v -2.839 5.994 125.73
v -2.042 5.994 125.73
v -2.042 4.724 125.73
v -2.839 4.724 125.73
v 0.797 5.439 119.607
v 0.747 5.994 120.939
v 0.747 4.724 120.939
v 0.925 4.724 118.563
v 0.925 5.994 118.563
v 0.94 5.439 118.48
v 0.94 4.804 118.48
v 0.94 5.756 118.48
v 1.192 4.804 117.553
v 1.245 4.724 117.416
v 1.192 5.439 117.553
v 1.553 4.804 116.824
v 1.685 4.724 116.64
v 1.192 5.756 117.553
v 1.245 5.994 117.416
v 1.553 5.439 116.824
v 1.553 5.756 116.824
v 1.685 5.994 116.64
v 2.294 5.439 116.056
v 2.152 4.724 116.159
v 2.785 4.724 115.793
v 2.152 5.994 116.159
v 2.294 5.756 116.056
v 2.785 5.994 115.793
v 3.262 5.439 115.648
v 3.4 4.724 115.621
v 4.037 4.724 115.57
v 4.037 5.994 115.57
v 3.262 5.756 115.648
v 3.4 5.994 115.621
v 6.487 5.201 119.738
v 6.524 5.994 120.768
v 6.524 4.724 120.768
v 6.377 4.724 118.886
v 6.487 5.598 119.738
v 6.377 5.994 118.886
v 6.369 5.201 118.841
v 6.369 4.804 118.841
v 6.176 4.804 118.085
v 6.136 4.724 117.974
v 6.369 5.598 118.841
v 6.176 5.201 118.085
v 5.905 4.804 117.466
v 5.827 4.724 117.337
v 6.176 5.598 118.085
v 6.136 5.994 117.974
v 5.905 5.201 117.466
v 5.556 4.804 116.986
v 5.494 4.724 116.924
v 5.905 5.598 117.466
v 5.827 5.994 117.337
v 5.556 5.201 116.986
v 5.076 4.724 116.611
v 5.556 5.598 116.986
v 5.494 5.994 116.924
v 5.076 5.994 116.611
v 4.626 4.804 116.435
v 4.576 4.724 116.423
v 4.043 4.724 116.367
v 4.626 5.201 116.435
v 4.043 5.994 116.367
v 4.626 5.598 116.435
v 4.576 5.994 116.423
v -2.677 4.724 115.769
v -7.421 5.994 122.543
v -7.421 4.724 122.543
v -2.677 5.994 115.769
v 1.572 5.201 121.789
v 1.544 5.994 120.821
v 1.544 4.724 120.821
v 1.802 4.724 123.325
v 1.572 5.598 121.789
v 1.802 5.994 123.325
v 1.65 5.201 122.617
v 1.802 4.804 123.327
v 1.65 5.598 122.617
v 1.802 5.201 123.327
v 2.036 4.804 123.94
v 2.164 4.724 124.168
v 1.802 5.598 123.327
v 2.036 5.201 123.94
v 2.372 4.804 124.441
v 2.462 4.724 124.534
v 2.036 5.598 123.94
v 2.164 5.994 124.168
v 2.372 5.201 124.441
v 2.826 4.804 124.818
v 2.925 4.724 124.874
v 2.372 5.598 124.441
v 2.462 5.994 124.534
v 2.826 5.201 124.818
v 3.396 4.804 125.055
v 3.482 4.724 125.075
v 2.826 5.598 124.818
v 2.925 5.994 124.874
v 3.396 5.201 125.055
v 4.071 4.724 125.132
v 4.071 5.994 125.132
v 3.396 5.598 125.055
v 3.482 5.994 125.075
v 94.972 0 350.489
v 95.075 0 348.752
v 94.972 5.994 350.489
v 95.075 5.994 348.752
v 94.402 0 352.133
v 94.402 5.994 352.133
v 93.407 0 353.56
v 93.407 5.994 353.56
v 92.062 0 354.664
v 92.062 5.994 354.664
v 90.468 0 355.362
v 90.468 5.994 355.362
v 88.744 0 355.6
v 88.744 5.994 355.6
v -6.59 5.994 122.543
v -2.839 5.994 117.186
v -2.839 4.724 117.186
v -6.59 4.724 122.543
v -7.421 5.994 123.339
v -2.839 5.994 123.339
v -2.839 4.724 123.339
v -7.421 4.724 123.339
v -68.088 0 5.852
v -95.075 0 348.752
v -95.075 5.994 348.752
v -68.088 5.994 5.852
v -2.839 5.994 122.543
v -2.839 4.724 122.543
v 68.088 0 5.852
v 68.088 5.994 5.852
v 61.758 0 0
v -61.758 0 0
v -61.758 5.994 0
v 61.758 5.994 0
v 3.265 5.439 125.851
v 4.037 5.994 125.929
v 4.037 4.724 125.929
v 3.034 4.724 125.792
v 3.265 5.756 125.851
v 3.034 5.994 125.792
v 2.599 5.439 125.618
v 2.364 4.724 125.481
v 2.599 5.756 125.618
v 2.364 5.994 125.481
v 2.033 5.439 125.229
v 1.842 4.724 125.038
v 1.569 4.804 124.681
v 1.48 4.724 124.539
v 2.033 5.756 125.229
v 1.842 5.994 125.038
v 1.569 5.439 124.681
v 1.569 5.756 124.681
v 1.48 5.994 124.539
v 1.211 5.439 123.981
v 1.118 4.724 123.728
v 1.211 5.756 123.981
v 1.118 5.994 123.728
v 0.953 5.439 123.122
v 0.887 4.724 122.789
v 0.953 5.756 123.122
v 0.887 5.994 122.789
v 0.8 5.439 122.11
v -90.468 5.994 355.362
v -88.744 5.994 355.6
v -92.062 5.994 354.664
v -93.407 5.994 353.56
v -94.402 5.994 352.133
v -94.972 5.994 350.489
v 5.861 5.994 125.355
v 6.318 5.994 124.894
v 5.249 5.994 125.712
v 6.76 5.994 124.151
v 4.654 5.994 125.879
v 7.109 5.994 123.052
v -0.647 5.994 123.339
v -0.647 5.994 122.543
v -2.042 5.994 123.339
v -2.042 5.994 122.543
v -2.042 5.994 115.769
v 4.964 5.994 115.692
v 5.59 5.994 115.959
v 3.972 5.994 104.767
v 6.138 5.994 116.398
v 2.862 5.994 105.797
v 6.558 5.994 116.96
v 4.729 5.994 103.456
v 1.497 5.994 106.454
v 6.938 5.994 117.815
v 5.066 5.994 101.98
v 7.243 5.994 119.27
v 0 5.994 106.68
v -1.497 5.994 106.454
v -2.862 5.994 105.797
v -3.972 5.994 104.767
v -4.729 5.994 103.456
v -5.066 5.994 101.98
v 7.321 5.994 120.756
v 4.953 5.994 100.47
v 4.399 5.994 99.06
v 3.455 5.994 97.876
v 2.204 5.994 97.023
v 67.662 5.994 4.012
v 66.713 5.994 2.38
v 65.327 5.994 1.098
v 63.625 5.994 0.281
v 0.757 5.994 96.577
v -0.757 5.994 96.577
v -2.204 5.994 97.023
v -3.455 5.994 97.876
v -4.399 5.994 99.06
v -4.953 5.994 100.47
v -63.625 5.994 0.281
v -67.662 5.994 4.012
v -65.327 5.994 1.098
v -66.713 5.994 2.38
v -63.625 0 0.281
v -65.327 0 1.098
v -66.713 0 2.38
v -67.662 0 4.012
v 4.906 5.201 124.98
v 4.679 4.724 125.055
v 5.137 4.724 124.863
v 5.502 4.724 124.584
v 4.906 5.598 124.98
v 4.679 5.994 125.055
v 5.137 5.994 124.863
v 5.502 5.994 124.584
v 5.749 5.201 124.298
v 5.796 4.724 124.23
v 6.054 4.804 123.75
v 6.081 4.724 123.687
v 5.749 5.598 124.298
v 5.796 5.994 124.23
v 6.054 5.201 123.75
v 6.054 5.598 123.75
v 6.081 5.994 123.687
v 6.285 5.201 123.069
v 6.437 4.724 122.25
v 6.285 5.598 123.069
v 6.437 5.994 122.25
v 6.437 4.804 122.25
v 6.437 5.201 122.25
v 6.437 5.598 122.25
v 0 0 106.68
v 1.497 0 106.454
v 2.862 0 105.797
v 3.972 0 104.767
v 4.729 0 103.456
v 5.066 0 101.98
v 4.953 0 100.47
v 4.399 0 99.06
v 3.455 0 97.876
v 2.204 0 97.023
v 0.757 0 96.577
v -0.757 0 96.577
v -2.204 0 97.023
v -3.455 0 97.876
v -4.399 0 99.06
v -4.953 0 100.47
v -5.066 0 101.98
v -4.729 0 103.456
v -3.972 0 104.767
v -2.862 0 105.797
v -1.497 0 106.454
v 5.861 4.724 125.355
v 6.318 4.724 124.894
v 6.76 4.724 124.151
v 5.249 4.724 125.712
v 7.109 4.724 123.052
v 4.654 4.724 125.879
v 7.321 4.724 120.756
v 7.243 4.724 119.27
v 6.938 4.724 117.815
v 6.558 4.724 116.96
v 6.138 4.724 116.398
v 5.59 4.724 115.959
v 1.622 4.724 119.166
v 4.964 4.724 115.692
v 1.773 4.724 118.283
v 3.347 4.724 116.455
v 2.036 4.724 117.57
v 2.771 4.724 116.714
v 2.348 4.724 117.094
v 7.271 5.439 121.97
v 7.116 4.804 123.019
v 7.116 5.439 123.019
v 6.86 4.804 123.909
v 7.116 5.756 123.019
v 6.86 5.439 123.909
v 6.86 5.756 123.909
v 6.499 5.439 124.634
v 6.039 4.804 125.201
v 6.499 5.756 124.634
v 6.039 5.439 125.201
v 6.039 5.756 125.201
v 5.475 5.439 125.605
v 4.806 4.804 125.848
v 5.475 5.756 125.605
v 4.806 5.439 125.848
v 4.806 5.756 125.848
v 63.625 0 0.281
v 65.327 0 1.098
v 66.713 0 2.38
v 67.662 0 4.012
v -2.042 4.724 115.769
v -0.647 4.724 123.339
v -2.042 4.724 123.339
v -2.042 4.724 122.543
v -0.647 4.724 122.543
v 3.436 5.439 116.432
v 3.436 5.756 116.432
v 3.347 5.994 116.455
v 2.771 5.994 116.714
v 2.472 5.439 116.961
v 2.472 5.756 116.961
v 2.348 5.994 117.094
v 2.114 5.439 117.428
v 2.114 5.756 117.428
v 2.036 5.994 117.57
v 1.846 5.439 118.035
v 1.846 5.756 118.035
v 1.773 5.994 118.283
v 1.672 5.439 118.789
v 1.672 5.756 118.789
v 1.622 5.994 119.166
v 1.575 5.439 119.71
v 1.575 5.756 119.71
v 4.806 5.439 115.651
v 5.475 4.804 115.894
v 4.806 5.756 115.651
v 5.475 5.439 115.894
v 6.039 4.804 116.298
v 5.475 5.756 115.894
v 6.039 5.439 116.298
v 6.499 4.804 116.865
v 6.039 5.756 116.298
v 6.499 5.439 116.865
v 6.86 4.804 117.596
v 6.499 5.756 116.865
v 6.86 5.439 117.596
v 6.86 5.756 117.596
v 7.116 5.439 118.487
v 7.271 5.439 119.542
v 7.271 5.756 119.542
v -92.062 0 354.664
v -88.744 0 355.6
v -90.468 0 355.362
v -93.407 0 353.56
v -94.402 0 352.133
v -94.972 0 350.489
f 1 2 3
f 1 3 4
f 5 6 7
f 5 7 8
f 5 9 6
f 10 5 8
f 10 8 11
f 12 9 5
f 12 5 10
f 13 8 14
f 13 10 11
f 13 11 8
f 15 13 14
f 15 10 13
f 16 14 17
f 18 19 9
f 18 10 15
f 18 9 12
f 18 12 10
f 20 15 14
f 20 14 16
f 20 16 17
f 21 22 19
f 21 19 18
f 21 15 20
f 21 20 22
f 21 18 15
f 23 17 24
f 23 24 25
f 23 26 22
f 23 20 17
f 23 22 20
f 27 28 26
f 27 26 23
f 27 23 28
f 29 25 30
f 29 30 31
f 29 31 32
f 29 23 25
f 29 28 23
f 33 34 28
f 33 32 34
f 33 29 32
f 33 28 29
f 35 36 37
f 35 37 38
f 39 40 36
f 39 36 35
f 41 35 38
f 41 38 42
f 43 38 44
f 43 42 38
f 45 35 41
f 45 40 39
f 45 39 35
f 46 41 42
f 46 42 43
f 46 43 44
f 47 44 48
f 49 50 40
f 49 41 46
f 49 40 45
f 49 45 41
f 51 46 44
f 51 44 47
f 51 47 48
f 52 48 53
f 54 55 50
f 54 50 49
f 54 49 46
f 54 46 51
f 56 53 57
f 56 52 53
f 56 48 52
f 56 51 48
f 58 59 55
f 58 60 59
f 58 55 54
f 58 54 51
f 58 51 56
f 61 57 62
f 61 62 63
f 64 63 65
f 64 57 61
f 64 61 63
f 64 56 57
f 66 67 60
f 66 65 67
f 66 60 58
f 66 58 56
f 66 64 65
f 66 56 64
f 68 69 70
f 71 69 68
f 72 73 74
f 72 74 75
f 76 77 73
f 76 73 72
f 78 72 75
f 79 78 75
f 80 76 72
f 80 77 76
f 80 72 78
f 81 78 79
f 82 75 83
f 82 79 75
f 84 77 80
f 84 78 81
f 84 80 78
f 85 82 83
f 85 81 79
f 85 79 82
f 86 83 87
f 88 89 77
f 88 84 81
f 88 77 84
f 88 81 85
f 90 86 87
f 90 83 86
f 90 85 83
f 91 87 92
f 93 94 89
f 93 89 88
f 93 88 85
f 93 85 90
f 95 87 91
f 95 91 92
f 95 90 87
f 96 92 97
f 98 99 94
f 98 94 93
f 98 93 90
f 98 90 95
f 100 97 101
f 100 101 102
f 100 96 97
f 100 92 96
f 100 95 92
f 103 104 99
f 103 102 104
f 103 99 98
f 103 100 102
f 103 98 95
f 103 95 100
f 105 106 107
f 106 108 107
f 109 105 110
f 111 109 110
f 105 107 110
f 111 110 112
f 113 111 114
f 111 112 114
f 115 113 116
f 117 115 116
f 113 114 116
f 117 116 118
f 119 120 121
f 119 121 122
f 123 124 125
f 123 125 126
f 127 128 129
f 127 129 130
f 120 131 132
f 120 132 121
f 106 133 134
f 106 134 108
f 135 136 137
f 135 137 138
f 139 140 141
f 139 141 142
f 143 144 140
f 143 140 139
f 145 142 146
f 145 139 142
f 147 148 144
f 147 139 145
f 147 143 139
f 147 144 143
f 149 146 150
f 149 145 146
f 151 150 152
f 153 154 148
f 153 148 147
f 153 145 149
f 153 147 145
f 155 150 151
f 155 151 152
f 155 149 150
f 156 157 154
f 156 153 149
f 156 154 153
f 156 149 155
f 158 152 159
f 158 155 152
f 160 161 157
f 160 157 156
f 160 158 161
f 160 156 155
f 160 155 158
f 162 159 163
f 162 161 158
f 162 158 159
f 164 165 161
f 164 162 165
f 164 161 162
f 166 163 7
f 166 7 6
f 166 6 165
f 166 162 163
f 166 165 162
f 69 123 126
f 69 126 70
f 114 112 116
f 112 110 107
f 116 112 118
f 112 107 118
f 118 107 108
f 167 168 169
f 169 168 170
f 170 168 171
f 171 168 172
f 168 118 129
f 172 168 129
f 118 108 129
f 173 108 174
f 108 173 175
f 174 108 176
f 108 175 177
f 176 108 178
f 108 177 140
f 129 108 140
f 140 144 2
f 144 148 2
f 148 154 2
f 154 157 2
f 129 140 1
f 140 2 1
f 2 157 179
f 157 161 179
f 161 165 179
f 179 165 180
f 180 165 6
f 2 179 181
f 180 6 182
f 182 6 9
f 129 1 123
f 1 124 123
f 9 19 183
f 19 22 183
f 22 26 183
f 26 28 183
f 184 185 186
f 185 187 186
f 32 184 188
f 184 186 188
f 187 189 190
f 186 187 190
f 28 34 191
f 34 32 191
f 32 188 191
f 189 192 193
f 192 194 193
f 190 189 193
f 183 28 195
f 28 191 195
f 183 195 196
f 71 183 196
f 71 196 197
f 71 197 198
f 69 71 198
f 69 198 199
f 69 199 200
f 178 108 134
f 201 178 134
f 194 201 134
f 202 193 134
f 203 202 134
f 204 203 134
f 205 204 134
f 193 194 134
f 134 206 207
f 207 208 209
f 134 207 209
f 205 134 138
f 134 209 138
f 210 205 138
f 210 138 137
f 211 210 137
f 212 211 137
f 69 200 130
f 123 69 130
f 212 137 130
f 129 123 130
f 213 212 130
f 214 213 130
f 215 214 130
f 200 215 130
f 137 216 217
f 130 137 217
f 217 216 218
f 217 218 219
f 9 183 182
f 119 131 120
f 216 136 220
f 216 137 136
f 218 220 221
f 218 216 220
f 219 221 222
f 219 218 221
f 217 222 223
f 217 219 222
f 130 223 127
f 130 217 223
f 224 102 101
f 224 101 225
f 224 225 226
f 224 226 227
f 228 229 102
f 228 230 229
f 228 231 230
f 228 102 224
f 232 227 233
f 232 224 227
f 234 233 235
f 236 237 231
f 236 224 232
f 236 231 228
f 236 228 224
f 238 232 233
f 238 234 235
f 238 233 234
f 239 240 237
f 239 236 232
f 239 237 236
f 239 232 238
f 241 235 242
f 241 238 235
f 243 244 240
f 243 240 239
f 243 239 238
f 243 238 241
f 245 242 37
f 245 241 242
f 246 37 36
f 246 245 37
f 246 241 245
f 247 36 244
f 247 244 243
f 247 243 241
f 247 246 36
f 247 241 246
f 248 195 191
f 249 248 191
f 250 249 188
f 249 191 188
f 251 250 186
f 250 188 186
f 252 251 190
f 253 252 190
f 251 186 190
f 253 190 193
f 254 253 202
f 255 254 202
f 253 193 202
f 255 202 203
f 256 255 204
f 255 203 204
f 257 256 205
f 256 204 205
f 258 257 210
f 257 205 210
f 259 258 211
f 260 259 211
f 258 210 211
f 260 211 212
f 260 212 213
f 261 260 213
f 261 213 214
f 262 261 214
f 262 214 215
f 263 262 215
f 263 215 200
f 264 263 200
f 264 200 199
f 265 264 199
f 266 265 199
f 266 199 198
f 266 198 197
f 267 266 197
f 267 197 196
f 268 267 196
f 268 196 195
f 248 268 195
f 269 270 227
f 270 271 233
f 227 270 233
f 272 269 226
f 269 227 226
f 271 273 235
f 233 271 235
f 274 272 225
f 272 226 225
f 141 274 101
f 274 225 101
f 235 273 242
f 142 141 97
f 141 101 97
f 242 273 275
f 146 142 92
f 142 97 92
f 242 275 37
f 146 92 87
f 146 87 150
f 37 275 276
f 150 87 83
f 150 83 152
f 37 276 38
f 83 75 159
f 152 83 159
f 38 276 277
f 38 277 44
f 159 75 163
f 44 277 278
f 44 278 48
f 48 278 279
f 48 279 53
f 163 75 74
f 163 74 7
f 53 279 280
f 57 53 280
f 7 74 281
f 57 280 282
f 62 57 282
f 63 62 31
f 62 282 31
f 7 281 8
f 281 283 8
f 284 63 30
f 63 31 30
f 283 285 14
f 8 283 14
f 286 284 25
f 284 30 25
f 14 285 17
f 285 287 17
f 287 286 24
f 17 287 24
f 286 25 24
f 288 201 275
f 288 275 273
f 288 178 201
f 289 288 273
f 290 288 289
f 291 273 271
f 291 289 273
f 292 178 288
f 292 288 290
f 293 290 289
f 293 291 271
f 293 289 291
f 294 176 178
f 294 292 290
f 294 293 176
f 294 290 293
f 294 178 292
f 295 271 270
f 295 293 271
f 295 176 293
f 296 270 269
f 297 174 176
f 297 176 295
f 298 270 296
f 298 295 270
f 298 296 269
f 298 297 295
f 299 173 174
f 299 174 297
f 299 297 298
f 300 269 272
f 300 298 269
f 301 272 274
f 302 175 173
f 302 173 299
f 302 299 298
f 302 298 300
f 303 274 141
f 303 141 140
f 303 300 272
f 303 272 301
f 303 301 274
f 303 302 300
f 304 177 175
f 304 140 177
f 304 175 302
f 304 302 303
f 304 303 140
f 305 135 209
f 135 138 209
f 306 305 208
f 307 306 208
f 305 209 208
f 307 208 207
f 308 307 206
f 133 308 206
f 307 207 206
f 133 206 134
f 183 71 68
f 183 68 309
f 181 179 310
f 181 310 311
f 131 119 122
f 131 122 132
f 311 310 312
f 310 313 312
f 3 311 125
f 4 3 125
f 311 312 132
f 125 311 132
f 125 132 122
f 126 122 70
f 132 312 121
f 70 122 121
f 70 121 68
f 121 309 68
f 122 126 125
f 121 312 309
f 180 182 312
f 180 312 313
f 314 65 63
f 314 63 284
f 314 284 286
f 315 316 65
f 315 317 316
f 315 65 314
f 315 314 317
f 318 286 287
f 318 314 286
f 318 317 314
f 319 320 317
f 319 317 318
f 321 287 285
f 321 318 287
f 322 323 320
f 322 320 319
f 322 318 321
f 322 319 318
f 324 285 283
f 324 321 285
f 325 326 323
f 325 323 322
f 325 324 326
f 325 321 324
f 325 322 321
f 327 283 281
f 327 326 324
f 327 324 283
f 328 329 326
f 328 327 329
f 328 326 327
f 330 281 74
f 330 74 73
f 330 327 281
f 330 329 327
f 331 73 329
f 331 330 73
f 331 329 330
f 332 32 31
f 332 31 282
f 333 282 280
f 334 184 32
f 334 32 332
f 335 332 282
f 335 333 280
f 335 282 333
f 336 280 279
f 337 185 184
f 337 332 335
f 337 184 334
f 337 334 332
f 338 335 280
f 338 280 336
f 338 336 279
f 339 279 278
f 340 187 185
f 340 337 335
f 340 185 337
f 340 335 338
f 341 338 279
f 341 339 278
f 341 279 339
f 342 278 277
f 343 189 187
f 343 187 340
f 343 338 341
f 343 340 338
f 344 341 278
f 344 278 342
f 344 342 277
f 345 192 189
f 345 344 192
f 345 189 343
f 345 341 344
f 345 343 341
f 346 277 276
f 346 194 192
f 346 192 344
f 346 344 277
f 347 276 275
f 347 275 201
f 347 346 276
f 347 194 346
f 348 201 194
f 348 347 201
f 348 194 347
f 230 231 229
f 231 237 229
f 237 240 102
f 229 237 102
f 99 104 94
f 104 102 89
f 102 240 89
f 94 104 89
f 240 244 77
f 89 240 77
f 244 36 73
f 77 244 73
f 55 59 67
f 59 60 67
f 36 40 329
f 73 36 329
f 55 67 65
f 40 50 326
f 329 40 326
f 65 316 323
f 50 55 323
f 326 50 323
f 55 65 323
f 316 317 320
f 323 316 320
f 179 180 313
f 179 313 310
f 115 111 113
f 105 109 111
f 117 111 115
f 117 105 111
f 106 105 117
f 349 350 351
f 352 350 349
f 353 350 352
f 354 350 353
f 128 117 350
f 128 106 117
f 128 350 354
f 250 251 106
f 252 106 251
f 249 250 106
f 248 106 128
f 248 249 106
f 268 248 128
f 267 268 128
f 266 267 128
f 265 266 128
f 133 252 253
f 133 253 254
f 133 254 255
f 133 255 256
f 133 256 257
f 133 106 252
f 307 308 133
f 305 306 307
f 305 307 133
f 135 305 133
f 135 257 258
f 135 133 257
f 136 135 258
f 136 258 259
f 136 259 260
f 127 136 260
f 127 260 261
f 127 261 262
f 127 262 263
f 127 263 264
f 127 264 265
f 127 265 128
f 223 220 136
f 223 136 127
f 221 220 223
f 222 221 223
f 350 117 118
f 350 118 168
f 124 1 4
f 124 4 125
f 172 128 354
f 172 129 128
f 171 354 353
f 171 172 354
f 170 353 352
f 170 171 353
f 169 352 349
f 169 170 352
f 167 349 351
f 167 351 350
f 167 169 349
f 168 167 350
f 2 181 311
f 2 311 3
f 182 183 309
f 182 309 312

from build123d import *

# Parameters (mm, degrees)
BOSS_EXTRUDE1_DEPTH = 5.9944
SKETCH2_R           = 5.08
CUT_EXTRUDE1_DEPTH  = 369.278830147
CUT_EXTRUDE2_DEPTH  = 1.27
FILLET1_R           = 6.35


with BuildPart() as part:
    # Sketch1 → Boss-Extrude1 (new body)
    with BuildSketch(Plane(origin=(0, 0, 0), x_dir=(1, 0, 0), z_dir=(0, 1, 0))):
        Polygon((-67.6275, 0), (67.6275, 0), (95.613826947, -355.6), (-95.613826947, -355.6), align=None)
    extrude(amount=BOSS_EXTRUDE1_DEPTH)

    # Sketch2 → Cut-Extrude1 (cut, through all)
    with BuildSketch(Plane(origin=(0, 5.9944, 0), x_dir=(1, 0, 0), z_dir=(0, 1, 0))):
        with Locations(Location((0, -101.6, 0), (0, 0, 270))):
            Circle(SKETCH2_R)
    extrude(amount=-CUT_EXTRUDE1_DEPTH, mode=Mode.SUBTRACT)

    # Sketch3 → Cut-Extrude2 (cut)
    # profile 1 of 2: a face of its own
    with BuildSketch(Plane(origin=(0, 5.9944, 0), x_dir=(1, 0, 0), z_dir=(0, 1, 0))):
        Polygon((-0.64745098, -123.339411765), (-2.041960784, -123.339411765), (-2.041960784, -125.73), (-2.838823529, -125.73), (-2.838823529, -123.339411765), (-7.420784314, -123.339411765), (-7.420784314, -122.54254902), (-2.676960784, -115.769215686), (-2.041960784, -115.769215686), (-2.041960784, -122.54254902), (-0.64745098, -122.54254902), align=None)
        Polygon((-2.838823529, -122.54254902), (-2.838823529, -117.185514706), (-6.589681373, -122.54254902), align=None, mode=Mode.SUBTRACT)
    # profile 2 of 2: a face of its own
    with BuildSketch(Plane(origin=(0, 5.9944, 0), x_dir=(1, 0, 0), z_dir=(0, 1, 0))):
        with BuildLine():
            add(Edge.make_bspline(
                [(7.321176471, -120.755833333), (7.318828398, -120.964435203), (7.314268428, -121.369541156), (7.278053355, -121.956745016), (7.212590307, -122.503235643), (7.123658685, -123.008755237), (7.008266172, -123.474678786), (6.871087333, -123.902056716), (6.702092819, -124.287425995), (6.508215245, -124.632617465), (6.291747836, -124.939879658), (6.045192851, -125.205053414), (5.774903263, -125.430333986), (5.47658793, -125.612983557), (5.154255704, -125.75891836), (4.803074469, -125.854617169), (4.428855706, -125.921386338), (4.17035965, -125.926554175), (4.037230392, -125.929215686)],
                knots=[0, 0, 0, 0, 1.444951835, 2.806104229, 4.07292158, 5.255788138, 6.359234241, 7.395665143, 8.361159583, 9.268708362, 10.134304339, 10.95819393, 11.769860228, 12.563733626, 13.374508403, 14.211708464, 15.079003648, 16, 16, 16, 16], degree=3))
            add(Edge.make_bspline(
                [(4.037230392, -125.929215686), (3.904173743, -125.926129436), (3.644961099, -125.920116997), (3.27017657, -125.859085315), (2.920411161, -125.763594373), (2.59640029, -125.625895969), (2.300139806, -125.446021212), (2.024069589, -125.233082993), (1.778627689, -124.975727427), (1.560171839, -124.679785297), (1.365195047, -124.347714828), (1.20253453, -123.973246068), (1.058366082, -123.562916679), (0.945634561, -123.112374896), (0.854092493, -122.625055928), (0.795691583, -122.097466824), (0.752427723, -121.531621273), (0.748884772, -121.140869167), (0.747058824, -120.939485294)],
                knots=[0, 0, 0, 0, 0.942187573, 1.835510922, 2.682899358, 3.50644207, 4.321041037, 5.132947656, 5.970162763, 6.831912057, 7.734836617, 8.692673853, 9.720484412, 10.813675431, 11.980358204, 13.231647047, 14.573260056, 16, 16, 16, 16], degree=3))
            add(Edge.make_bspline(
                [(0.747058824, -120.939485294), (0.749189738, -120.709081181), (0.753301018, -120.264550974), (0.791785956, -119.623892076), (0.848921011, -119.033607435), (0.931327178, -118.493626742), (1.041809864, -118.002956136), (1.18209133, -117.562748274), (1.344352733, -117.168906906), (1.542969603, -116.826611164), (1.76640963, -116.527719309), (2.011736134, -116.265404707), (2.288722816, -116.05041743), (2.588716504, -115.873144616), (2.914180915, -115.735469097), (3.266151279, -115.640569114), (3.642854433, -115.578856283), (3.90312556, -115.573011518), (4.037230392, -115.57)],
                knots=[0, 0, 0, 0, 1.545108237, 2.981054794, 4.302900454, 5.52134946, 6.64223763, 7.672189641, 8.617001291, 9.493094031, 10.318410963, 11.115795503, 11.893970542, 12.661367534, 13.447190288, 14.255881535, 15.101342067, 16, 16, 16, 16], degree=3))
            add(Edge.make_bspline(
                [(4.037230392, -115.57), (4.170238627, -115.57448963), (4.428282356, -115.583199774), (4.804192318, -115.642018007), (5.152618043, -115.745772402), (5.478653289, -115.884356647), (5.772542755, -116.073295118), (6.047681503, -116.293496105), (6.289327541, -116.562467111), (6.510315761, -116.867199073), (6.701841879, -117.215226558), (6.869820244, -117.601739646), (7.009467972, -118.029371708), (7.123413066, -118.496780378), (7.21266615, -119.005311375), (7.277684225, -119.552884468), (7.314472673, -120.141074122), (7.318890361, -120.546189931), (7.321176471, -120.755833333)],
                knots=[0, 0, 0, 0, 0.919968977, 1.784793451, 2.622728724, 3.429378823, 4.225844794, 5.031728358, 5.85964663, 6.718105312, 7.630541726, 8.601153045, 9.629202519, 10.737948011, 11.926092541, 13.198121829, 14.550055913, 16, 16, 16, 16], degree=3))
        make_face()
        with BuildLine():
            add(Edge.make_bspline(
                [(6.524313725, -120.768284314), (6.522566947, -120.59082563), (6.519183425, -120.247086842), (6.491882586, -119.747351272), (6.442379883, -119.282006526), (6.374689104, -118.850591154), (6.287787289, -118.454473729), (6.184085269, -118.091152232), (6.054789642, -117.764549081), (5.914753741, -117.468482457), (5.746577036, -117.21145005), (5.563889756, -116.983709924), (5.356631682, -116.79434266), (5.134096525, -116.633668508), (4.887159424, -116.51702345), (4.624573174, -116.42744118), (4.339914631, -116.378499272), (4.144272117, -116.370819959), (4.043455882, -116.366862745)],
                knots=[0, 0, 0, 0, 1.502278276, 2.909924168, 4.234983773, 5.462469173, 6.604815465, 7.666614396, 8.656743616, 9.57599474, 10.43362925, 11.251287335, 12.040715275, 12.803499886, 13.565626727, 14.343386511, 15.146333119, 16, 16, 16, 16], degree=3))
            add(Edge.make_bspline(
                [(4.043455882, -116.366862745), (3.938447052, -116.369409337), (3.734422845, -116.374357173), (3.43835687, -116.425549656), (3.163244621, -116.509328168), (2.90892764, -116.62546025), (2.673837753, -116.772323146), (2.465862577, -116.959962497), (2.272440236, -117.175944485), (2.105615234, -117.430931462), (1.958401995, -117.71853329), (1.838162718, -118.042916058), (1.738143905, -118.401926091), (1.665875136, -118.800267442), (1.610637384, -119.239896883), (1.570198504, -119.724849093), (1.550557152, -120.257632824), (1.546194025, -120.628198528), (1.543921569, -120.82120098)],
                knots=[0, 0, 0, 0, 0.869467109, 1.689308758, 2.480750345, 3.246411928, 4.000153033, 4.767743238, 5.559605047, 6.396624794, 7.284891774, 8.231849658, 9.258192498, 10.369472511, 11.583108734, 12.929054675, 14.400553601, 16, 16, 16, 16], degree=3))
            add(Edge.make_bspline(
                [(1.543921569, -120.82120098), (1.544614632, -120.988289367), (1.54595406, -121.311207558), (1.570315432, -121.778131708), (1.598441181, -122.210377927), (1.645028029, -122.609499828), (1.709082826, -122.979104893), (1.796740701, -123.322117953), (1.902442711, -123.64204798), (2.027679077, -123.937897338), (2.18133626, -124.206925847), (2.364747317, -124.444835267), (2.580966733, -124.649942715), (2.82339308, -124.825742486), (3.097933318, -124.96336255), (3.398653863, -125.062824592), (3.726651153, -125.123356927), (3.95395607, -125.129287098), (4.071470588, -125.132352941)],
                knots=[0, 0, 0, 0, 1.411809826, 2.728490499, 3.95043818, 5.071756233, 6.122676174, 7.117949067, 8.060697316, 8.967954545, 9.828234386, 10.671864258, 11.496693245, 12.338635446, 13.193491276, 14.080783746, 15.007783125, 16, 16, 16, 16], degree=3))
            add(Edge.make_bspline(
                [(4.071470588, -125.132352941), (4.170329033, -125.130072963), (4.364367231, -125.125597848), (4.644218388, -125.069712213), (4.907756322, -124.987576413), (5.148049832, -124.862984482), (5.372323269, -124.710857365), (5.572547405, -124.519087844), (5.758725654, -124.297778208), (5.918122592, -124.036648789), (6.062406119, -123.745178799), (6.186127809, -123.4196766), (6.291039197, -123.06045838), (6.37874373, -122.667596662), (6.4407328, -122.240695517), (6.492645246, -121.781020892), (6.51900758, -121.286348012), (6.522506852, -120.944697746), (6.524313725, -120.768284314)],
                knots=[0, 0, 0, 0, 0.843506666, 1.655625022, 2.429524786, 3.194843558, 3.95975131, 4.737602927, 5.556133668, 6.424576934, 7.344541811, 8.332537572, 9.395844817, 10.540307741, 11.769239909, 13.080349428, 14.492418622, 16, 16, 16, 16], degree=3))
        make_face(mode=Mode.SUBTRACT)
    extrude(amount=-CUT_EXTRUDE2_DEPTH, mode=Mode.SUBTRACT)

    # Fillet1
    fillet1_edges = [part.edges().sort_by_distance(p)[0] for p in [
        (95.613826947, 2.9972, 355.6),
        (-95.613826947, 2.9972, 355.6),
        (-67.6275, 2.9972, 0),
        (67.6275, 2.9972, 0),
    ]]
    fillet(fillet1_edges, radius=FILLET1_R)


solid = part.part
